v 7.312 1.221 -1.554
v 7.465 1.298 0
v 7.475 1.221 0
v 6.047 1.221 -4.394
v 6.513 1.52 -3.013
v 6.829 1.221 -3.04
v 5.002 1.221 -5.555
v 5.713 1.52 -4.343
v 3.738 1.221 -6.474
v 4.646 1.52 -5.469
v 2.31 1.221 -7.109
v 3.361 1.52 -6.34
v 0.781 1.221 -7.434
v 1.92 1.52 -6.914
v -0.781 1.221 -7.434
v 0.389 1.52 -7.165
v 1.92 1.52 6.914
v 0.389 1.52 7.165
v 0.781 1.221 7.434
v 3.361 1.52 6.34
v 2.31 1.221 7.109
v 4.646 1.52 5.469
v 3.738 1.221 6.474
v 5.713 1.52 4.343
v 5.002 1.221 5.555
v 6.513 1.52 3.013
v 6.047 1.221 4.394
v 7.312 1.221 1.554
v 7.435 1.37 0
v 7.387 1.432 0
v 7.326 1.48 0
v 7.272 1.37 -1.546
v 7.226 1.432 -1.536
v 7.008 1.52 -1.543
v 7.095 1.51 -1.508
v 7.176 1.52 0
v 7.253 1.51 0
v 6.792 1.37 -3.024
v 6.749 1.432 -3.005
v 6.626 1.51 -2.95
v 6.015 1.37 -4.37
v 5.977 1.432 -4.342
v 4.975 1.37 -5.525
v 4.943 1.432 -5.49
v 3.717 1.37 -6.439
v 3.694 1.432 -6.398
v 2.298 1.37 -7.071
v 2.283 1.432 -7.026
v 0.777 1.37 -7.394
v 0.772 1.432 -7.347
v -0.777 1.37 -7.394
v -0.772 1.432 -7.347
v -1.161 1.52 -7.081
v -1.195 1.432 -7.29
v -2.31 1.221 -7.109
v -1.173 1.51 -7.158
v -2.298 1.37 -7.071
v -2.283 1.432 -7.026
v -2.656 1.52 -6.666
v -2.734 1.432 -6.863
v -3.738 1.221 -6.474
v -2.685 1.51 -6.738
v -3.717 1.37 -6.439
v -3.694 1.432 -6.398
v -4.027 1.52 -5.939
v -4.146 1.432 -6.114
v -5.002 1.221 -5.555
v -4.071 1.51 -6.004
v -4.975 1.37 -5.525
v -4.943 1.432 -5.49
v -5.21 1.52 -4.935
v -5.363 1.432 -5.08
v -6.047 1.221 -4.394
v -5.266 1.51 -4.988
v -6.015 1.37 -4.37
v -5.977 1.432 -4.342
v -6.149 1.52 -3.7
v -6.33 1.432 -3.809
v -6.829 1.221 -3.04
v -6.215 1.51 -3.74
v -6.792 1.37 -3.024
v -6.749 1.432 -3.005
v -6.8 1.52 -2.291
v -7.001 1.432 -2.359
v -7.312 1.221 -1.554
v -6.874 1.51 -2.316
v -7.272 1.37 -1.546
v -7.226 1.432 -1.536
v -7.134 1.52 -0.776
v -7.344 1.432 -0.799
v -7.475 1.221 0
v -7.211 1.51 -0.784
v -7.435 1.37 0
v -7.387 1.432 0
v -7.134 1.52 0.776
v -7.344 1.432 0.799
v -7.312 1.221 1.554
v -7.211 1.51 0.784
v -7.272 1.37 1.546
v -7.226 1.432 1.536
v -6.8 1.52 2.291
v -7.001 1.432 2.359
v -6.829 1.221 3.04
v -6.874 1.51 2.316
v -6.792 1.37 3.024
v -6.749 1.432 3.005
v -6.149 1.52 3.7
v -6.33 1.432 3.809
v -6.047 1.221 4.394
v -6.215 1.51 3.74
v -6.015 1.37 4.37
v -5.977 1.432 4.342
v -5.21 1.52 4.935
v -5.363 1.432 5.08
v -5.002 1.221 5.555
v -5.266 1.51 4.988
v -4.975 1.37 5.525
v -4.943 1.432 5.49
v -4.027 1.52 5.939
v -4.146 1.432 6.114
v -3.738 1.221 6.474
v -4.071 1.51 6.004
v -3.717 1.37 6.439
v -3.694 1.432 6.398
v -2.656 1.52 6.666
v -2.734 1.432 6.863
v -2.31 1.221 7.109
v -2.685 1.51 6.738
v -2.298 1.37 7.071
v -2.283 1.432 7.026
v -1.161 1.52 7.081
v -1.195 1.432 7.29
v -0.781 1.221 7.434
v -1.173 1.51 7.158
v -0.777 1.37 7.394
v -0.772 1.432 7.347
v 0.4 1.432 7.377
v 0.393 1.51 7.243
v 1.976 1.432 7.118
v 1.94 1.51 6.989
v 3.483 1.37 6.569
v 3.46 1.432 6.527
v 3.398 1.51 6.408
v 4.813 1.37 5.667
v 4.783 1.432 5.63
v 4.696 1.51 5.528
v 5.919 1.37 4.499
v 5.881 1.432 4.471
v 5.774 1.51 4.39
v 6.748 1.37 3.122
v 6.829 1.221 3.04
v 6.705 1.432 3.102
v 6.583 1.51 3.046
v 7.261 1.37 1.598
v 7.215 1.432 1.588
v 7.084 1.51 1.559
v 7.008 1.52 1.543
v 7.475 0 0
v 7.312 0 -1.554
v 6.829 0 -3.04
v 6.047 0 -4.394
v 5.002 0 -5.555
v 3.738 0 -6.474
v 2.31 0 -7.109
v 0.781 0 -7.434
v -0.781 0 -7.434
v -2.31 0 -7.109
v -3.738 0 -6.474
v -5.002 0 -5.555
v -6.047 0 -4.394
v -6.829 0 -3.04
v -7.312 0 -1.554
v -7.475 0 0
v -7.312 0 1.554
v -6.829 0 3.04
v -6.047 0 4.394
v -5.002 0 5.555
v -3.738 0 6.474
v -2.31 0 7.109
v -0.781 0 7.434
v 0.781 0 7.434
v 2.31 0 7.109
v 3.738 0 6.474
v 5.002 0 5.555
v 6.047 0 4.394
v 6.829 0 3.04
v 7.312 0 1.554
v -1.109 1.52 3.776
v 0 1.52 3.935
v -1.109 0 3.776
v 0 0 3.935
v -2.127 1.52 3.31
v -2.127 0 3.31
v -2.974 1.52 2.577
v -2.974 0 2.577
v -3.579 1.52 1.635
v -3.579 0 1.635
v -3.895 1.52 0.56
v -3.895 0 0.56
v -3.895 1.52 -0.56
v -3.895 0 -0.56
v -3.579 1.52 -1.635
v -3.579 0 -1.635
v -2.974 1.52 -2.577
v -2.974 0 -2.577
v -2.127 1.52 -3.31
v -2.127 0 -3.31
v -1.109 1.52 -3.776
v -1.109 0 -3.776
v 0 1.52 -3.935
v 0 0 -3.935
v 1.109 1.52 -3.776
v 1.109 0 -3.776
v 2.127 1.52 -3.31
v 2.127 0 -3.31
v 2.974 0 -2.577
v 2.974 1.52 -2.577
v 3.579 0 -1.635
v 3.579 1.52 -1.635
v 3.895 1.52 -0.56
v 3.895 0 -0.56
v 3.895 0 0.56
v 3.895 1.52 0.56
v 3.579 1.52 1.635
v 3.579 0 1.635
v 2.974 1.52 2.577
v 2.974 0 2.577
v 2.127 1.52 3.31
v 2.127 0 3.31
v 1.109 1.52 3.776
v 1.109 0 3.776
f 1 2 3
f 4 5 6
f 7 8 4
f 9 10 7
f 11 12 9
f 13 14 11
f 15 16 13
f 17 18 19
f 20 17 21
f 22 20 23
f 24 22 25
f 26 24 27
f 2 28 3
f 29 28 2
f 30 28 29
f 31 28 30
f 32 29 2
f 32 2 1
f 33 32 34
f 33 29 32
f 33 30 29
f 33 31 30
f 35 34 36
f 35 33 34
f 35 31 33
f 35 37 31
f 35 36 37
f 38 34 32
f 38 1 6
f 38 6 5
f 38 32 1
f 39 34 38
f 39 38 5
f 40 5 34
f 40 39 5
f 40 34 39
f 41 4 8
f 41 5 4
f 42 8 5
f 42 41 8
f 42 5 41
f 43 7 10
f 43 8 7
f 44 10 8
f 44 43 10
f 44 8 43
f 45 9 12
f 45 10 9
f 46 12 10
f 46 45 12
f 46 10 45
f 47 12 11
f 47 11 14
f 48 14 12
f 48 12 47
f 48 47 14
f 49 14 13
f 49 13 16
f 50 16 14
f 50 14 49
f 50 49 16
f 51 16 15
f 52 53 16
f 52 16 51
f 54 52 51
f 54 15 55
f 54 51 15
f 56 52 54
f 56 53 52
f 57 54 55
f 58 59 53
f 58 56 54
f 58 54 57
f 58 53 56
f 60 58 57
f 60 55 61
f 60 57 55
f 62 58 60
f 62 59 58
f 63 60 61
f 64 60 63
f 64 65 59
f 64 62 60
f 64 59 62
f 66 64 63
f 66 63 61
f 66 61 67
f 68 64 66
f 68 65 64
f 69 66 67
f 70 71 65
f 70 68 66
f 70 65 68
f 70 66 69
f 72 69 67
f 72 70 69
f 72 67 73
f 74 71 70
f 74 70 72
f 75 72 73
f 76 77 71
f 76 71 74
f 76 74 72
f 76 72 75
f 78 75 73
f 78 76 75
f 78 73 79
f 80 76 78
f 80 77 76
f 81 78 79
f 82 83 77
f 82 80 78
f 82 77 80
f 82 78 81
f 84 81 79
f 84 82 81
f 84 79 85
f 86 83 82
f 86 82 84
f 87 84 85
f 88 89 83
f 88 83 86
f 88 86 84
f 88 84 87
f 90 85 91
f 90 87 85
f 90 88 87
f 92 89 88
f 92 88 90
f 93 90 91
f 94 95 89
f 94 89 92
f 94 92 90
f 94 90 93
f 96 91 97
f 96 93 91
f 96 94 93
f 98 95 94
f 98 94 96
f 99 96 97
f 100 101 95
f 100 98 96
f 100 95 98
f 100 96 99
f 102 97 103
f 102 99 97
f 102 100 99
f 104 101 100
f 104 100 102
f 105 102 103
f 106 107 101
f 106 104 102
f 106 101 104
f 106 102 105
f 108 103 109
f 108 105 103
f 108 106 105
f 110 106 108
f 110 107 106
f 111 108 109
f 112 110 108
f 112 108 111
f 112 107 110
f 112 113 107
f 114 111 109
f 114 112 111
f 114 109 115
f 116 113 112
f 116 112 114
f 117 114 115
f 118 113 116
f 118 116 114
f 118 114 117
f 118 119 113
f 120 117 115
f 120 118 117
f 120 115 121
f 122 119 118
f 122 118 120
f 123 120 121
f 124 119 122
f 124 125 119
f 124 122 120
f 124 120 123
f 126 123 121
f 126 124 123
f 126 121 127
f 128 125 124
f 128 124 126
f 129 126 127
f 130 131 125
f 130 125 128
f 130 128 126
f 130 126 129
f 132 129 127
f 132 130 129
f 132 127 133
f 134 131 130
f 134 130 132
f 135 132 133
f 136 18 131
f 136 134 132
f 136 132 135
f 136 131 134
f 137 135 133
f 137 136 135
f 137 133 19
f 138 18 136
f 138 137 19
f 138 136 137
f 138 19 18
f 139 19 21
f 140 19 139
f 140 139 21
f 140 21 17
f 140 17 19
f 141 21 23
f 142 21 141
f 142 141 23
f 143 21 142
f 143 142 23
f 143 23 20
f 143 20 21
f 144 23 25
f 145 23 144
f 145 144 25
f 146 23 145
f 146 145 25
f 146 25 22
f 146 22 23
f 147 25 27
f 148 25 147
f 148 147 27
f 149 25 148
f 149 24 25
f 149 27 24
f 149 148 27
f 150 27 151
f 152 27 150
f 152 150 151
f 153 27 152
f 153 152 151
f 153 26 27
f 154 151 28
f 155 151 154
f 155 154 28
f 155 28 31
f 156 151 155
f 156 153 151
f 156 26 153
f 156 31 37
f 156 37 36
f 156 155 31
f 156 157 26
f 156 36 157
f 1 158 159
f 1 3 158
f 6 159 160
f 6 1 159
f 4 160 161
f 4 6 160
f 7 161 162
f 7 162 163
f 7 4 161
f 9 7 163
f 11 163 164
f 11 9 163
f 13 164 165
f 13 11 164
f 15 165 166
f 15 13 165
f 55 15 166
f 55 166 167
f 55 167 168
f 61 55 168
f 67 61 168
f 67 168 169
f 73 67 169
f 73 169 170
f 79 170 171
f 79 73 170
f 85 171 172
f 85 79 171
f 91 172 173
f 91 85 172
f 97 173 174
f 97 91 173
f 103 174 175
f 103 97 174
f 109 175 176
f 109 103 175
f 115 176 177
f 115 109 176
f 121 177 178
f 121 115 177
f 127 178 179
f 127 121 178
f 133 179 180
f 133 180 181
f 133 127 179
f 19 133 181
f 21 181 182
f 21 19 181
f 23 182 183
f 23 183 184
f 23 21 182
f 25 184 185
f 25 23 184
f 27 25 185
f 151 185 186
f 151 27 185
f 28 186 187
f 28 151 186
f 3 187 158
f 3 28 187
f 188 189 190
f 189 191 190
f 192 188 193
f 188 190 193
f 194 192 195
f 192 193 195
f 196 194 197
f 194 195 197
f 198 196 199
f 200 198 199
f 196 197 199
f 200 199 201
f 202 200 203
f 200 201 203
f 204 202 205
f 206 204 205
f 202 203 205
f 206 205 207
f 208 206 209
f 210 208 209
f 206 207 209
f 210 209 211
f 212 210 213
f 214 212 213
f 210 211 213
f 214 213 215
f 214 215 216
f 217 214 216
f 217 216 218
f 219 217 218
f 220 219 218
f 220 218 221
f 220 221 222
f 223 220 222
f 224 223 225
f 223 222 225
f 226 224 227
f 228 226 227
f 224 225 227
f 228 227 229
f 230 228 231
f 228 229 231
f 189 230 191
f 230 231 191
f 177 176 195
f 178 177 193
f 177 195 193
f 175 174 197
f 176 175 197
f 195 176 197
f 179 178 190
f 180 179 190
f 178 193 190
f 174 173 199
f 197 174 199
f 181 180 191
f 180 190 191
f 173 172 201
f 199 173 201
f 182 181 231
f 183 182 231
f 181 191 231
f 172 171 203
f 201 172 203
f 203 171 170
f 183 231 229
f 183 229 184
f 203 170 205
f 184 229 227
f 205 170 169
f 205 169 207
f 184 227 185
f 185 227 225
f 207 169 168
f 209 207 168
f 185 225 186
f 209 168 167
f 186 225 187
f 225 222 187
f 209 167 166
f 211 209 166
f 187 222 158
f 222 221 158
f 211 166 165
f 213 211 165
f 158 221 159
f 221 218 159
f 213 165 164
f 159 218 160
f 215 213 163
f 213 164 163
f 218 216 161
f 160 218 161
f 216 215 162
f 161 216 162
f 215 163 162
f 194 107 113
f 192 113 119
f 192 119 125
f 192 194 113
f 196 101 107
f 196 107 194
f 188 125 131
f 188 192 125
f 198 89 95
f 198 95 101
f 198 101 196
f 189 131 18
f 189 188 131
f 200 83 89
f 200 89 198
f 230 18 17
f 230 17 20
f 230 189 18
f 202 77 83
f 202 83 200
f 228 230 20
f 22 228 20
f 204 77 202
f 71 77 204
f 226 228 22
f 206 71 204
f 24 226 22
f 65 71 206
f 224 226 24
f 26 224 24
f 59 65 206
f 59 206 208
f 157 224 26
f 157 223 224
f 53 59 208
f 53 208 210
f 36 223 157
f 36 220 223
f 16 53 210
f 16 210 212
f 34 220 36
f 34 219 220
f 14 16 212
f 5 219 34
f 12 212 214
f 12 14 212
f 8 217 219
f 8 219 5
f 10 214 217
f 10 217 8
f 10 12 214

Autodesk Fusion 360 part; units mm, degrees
cylinder "CylindrePrimitive1" add diameter 14.95 height 1.52 placed x (1, 0, 0) y (0, 0, -1) z (0, 1, 0) at (0, 0, 0)
hole "Perçage1" at (0, 1.52, 0) direction (0, -1, 0) diameter 7.87 end through all
fillet "Congé1" radius 0.299 1 edges at (-6.9691, 1.52, 2.7031)
equation "rond_diam = 14.95 mm"
equation "tige_diam = 7.87 mm"
equation "d5 = rond_ep"
equation "rond_ep = 1.52 mm"
equation "d9 = tige_diam"
equation "d12 = rond_diam / 50"
equation "d12 = rond_diam / 50"
